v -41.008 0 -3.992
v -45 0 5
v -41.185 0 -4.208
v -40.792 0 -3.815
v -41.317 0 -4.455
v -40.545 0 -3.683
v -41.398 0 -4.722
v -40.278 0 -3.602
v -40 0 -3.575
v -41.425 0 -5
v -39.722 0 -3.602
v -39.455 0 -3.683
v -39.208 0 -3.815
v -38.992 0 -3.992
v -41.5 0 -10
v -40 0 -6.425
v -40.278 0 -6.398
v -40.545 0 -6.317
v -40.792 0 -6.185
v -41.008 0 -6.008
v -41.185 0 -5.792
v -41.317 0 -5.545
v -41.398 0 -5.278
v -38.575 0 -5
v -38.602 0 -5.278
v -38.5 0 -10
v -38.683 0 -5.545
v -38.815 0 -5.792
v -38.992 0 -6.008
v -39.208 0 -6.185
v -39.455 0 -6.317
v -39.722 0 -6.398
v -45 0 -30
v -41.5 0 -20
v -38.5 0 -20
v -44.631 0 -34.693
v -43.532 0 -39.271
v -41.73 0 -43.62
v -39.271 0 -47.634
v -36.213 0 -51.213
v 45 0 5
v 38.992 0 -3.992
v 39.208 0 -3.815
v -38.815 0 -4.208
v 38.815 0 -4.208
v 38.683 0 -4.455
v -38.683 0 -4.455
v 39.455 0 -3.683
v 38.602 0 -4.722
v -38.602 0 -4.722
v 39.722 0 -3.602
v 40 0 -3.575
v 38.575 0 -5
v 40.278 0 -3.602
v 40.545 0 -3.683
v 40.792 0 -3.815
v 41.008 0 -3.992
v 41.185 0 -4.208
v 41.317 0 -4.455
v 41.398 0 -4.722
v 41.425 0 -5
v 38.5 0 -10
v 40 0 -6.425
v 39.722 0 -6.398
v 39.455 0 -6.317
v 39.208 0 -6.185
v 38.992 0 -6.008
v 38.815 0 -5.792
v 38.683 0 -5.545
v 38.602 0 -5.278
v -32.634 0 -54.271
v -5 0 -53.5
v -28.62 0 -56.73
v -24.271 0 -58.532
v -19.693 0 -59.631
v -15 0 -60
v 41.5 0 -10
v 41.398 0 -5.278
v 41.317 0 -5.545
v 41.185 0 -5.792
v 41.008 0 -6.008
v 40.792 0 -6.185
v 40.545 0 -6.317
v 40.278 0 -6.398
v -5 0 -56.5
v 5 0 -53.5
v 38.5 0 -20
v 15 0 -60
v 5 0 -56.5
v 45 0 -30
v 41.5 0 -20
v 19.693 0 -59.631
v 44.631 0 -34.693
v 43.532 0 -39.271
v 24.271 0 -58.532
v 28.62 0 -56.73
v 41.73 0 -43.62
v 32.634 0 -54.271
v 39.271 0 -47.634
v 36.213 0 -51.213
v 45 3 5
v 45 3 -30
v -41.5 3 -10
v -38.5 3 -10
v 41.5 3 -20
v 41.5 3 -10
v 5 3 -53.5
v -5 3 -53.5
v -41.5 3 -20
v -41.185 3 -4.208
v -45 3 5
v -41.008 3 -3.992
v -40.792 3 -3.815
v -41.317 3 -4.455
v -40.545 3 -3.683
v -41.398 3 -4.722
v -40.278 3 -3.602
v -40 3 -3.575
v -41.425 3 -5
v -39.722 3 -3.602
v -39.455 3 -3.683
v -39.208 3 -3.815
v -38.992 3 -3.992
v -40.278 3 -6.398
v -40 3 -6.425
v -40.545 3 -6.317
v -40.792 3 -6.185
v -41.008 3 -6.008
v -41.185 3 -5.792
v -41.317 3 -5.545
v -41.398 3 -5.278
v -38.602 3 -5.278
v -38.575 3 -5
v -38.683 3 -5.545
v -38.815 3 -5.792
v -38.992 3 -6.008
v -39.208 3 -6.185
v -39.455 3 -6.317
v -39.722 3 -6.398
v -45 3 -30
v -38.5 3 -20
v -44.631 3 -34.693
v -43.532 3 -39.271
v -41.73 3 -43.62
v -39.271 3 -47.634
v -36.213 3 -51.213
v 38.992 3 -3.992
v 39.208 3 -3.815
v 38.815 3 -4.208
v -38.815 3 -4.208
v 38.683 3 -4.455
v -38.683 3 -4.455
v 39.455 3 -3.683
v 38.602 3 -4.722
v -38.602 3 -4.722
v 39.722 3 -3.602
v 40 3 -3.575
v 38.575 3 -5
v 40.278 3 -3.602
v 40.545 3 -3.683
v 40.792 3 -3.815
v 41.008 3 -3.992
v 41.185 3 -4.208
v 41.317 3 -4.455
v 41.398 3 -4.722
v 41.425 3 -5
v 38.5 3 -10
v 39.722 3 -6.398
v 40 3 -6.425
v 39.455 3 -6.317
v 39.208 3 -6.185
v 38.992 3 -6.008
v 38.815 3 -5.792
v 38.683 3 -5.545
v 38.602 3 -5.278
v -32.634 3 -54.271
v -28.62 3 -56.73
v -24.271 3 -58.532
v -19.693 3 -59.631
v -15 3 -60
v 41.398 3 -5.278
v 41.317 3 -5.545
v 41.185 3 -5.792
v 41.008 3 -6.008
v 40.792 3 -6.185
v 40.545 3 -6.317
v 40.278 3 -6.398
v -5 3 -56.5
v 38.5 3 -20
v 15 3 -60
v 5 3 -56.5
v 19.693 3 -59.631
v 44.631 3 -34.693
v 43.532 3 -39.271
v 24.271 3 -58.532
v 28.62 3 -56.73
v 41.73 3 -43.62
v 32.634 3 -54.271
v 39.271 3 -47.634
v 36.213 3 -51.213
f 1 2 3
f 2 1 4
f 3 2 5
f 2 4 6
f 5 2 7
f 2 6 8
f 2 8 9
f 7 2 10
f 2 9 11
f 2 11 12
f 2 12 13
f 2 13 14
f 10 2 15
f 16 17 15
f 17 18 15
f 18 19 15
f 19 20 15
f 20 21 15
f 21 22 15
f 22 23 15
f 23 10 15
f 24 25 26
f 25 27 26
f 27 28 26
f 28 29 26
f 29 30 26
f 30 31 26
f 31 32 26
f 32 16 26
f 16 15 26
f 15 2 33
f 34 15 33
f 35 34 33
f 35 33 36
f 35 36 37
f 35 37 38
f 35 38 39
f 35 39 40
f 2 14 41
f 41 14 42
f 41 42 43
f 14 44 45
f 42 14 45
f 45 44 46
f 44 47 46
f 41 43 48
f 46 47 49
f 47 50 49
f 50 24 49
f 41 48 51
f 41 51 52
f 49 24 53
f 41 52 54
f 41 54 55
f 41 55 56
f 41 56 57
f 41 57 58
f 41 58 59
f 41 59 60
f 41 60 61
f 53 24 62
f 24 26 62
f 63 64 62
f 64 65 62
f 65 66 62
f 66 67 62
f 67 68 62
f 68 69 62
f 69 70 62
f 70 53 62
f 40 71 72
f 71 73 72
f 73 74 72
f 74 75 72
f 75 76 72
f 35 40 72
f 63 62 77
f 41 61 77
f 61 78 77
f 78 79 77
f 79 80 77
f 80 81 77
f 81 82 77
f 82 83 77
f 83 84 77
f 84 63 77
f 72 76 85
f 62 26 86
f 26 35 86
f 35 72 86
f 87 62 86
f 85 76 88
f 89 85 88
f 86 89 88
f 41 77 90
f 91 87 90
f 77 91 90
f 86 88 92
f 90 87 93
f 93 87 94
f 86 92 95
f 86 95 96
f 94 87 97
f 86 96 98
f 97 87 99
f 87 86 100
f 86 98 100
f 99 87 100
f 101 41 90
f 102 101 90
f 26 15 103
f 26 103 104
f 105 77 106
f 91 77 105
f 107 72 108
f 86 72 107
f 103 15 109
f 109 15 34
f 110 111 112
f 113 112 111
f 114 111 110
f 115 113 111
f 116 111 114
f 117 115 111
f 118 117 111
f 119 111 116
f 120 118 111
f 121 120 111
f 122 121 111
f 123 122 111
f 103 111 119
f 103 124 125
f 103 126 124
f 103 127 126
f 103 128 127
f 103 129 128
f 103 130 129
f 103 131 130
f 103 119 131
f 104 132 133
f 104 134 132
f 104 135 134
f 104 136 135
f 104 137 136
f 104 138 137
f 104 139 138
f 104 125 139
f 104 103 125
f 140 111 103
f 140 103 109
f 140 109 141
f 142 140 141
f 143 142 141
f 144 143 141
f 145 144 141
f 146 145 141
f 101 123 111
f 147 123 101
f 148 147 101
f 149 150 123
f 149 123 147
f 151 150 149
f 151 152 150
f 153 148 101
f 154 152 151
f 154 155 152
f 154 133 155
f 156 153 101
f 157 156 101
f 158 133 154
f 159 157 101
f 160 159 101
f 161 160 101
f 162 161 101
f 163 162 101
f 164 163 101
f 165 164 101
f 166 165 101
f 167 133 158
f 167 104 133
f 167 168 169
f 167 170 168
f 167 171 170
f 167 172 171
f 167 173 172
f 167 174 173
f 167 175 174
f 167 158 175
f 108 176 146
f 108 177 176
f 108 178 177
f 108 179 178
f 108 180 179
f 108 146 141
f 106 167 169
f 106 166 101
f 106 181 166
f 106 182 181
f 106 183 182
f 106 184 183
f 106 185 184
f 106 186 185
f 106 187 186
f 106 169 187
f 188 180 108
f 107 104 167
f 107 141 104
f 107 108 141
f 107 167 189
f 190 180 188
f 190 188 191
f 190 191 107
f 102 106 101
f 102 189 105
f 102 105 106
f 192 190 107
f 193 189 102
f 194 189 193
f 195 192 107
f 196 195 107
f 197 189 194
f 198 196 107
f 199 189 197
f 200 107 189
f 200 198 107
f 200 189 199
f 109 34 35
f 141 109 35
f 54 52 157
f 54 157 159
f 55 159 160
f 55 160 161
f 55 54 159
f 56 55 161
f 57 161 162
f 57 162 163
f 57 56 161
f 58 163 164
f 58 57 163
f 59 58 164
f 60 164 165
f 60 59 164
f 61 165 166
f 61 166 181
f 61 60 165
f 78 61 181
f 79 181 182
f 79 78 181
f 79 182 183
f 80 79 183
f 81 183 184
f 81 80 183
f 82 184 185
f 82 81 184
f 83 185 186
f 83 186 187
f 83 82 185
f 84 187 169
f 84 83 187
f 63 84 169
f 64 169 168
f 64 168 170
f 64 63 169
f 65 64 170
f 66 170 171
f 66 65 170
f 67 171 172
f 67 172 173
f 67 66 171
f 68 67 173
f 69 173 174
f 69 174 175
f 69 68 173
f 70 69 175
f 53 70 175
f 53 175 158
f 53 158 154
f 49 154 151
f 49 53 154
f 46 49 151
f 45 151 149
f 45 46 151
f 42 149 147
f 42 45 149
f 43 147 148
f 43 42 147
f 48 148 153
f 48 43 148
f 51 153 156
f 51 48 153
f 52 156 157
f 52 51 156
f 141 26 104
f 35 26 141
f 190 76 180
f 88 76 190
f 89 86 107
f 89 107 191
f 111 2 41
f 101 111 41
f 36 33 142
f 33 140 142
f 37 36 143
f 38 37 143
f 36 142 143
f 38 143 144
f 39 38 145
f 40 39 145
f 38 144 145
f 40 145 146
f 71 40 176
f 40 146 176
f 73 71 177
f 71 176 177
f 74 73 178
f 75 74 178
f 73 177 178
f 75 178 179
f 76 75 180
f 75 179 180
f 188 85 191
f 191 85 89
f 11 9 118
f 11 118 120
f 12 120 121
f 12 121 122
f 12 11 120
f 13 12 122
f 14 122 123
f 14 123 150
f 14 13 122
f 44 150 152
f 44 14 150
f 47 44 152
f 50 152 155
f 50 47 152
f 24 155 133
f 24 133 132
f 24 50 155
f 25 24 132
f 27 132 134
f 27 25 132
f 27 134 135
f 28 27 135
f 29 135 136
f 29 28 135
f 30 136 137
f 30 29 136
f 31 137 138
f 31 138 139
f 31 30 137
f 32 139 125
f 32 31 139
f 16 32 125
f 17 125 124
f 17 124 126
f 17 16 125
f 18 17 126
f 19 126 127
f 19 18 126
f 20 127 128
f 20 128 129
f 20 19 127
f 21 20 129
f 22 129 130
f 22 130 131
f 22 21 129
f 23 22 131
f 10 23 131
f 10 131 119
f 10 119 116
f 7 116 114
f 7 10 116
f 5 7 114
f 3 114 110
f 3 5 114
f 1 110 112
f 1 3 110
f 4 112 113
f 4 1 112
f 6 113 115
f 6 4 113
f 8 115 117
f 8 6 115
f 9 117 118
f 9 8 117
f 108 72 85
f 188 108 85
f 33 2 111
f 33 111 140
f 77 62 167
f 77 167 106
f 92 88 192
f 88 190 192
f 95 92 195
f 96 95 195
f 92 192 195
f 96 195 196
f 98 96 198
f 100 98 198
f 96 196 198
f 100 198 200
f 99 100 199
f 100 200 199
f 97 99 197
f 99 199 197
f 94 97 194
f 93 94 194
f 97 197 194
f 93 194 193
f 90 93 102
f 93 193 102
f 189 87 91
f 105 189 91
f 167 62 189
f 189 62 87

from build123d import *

# Parameters (mm, degrees)
SKETCH1_W           = 90
SKETCH1_H           = 65
SKETCH1_R           = 1.425
SKETCH1_W_2         = 10
SKETCH1_H_2         = 3
SKETCH1_W_3         = 3
SKETCH1_H_3         = 10
BOSS_EXTRUDE1_DEPTH = 3
FILLET1_R           = 30


with BuildPart() as part:
    # Sketch1 → Boss-Extrude1 (new body)
    with BuildSketch(Plane(origin=(0, 0, 0), x_dir=(1, 0, 0), z_dir=(0, 1, 0))):
        with Locations((0, 27.5)):
            Rectangle(SKETCH1_W, SKETCH1_H)
        with Locations(Location((-40, 5, 0), (0, 0, 270))):
            Circle(SKETCH1_R, mode=Mode.SUBTRACT)
        with Locations(Location((40, 5, 0), (0, 0, 270))):
            Circle(SKETCH1_R, mode=Mode.SUBTRACT)
        with Locations((0, 55)):
            Rectangle(SKETCH1_W_2, SKETCH1_H_2, mode=Mode.SUBTRACT)
        with Locations((-40, 15)):
            Rectangle(SKETCH1_W_3, SKETCH1_H_3, mode=Mode.SUBTRACT)
        with Locations((40, 15)):
            Rectangle(SKETCH1_W_3, SKETCH1_H_3, mode=Mode.SUBTRACT)
    extrude(amount=BOSS_EXTRUDE1_DEPTH)

    # Fillet1
    fillet1_edges = [part.edges().sort_by_distance(p)[0] for p in [
        (-45, 1.5, -60),
        (45, 1.5, -60),
    ]]
    fillet(fillet1_edges, radius=FILLET1_R)


solid = part.part
